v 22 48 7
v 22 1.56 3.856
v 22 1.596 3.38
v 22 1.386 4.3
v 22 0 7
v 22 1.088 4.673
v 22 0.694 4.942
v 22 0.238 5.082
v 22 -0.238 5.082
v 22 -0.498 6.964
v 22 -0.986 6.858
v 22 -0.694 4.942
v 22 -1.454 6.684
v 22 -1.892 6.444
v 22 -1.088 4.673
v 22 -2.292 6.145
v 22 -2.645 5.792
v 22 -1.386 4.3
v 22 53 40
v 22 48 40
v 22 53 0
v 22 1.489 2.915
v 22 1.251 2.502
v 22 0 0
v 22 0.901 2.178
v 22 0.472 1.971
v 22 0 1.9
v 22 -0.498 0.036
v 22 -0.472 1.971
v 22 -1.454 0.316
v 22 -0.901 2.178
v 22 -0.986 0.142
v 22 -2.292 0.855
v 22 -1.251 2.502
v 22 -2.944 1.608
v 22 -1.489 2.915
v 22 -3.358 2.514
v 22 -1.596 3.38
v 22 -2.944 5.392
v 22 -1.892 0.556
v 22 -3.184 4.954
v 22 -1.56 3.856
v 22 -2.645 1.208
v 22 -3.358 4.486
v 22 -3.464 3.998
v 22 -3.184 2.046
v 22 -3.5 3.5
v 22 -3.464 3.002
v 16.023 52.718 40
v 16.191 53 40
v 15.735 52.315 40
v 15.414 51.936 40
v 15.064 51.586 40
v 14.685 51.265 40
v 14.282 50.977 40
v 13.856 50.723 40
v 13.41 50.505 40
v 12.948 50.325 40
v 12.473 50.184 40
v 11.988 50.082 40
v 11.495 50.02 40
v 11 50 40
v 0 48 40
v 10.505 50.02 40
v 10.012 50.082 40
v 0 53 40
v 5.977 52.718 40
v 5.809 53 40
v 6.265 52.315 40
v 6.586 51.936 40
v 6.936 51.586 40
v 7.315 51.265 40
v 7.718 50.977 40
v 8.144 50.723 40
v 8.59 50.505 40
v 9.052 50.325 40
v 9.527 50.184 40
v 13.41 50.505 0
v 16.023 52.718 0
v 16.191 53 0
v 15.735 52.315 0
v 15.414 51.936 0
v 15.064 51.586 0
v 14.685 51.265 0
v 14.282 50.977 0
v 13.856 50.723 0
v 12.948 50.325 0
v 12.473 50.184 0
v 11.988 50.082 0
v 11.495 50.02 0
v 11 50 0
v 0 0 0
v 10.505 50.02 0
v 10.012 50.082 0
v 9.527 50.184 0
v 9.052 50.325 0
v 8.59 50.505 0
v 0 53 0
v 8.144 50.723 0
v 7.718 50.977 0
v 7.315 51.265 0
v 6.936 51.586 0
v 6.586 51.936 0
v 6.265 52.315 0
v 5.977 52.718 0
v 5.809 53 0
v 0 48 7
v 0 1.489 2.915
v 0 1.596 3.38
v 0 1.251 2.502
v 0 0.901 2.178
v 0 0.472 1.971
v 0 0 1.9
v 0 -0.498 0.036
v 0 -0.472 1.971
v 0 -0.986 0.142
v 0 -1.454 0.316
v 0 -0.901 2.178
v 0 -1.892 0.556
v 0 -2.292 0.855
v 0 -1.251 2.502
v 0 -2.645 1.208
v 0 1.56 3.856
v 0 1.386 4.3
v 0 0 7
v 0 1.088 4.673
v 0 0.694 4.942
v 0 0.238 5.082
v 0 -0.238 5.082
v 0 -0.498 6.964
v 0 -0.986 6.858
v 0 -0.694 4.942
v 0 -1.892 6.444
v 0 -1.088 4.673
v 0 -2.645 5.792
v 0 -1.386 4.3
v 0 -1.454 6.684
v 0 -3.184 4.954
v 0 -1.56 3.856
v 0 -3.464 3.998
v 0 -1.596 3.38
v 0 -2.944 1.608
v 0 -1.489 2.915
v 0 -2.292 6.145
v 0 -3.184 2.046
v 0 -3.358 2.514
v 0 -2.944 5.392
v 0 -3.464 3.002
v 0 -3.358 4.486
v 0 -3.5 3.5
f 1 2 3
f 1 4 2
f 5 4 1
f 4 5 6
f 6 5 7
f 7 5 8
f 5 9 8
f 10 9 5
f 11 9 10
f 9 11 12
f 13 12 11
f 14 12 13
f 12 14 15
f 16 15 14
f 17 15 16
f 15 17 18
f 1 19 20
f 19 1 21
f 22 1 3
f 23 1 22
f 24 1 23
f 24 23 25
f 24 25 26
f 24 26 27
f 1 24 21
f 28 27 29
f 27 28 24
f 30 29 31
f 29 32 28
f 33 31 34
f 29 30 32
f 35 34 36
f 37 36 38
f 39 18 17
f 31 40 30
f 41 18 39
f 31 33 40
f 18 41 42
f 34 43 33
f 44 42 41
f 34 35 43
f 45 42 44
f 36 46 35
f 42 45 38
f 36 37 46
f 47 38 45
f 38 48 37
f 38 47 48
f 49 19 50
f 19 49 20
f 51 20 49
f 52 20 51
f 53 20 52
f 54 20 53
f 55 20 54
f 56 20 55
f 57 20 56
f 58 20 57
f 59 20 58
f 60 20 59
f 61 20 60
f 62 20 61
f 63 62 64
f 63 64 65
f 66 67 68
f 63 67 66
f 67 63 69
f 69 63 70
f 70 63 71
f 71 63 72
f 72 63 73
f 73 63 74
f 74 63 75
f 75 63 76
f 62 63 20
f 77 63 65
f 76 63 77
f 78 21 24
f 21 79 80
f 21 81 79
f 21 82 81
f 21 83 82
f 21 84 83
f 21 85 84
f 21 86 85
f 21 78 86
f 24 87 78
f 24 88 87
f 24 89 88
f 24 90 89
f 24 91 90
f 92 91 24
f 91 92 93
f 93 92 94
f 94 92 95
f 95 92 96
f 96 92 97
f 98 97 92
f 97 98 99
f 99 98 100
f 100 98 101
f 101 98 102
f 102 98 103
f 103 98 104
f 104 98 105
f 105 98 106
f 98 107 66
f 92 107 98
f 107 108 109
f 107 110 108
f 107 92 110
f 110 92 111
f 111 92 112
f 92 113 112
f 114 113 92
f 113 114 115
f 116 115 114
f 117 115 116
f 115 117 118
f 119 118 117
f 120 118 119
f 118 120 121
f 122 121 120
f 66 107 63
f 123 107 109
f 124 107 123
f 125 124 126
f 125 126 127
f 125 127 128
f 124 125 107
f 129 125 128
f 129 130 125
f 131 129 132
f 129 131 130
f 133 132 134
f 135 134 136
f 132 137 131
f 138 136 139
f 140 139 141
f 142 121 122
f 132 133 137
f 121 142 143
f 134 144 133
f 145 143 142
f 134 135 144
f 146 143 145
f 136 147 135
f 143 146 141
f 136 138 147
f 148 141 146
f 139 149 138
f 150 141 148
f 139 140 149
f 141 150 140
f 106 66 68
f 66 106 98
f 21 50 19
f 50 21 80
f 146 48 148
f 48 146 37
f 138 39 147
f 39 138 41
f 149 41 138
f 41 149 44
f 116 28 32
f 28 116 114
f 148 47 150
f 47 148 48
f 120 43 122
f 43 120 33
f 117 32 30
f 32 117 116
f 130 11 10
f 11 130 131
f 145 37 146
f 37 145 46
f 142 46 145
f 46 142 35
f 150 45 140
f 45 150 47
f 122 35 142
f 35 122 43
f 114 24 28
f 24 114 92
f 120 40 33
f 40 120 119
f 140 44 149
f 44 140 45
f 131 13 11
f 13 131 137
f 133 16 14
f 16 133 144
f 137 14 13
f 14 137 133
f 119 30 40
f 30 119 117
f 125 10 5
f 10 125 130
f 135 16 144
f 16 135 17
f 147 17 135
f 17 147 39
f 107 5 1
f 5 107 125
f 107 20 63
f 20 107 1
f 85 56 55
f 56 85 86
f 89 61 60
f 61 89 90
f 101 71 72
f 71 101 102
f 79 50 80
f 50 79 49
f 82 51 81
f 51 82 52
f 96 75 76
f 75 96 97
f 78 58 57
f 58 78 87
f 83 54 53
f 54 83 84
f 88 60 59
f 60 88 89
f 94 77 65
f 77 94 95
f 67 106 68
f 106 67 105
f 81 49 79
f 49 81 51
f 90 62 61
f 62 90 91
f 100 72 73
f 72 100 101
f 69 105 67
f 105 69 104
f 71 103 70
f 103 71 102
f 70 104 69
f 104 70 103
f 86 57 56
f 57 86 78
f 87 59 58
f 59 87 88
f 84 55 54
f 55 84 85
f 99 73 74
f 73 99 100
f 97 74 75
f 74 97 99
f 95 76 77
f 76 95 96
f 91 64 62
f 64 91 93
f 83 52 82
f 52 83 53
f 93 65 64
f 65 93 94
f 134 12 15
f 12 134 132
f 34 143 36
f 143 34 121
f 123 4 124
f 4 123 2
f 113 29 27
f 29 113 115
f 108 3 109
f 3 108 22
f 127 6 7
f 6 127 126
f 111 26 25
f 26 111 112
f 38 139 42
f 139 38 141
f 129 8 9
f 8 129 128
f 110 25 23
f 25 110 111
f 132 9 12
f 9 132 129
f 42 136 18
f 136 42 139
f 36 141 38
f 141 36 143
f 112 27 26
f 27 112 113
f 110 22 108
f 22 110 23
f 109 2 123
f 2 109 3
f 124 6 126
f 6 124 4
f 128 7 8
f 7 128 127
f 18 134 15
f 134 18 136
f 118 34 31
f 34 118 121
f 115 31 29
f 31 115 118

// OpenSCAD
$fa=.5;
$fs=.5;

difference() {
    union() {
        cube([22,53,40]);
        translate([0,0,3.5]) rotate([0,90,0]) cylinder(r=3.5, h=22);
    }
    translate([-1,-5,7]) cube([24,53,40]);
    translate([11, 56, -1]) cylinder(r=6, h=42);
    translate([-1,0,3.5]) rotate([0,90,0]) cylinder(r=1.6, h=24);
}
